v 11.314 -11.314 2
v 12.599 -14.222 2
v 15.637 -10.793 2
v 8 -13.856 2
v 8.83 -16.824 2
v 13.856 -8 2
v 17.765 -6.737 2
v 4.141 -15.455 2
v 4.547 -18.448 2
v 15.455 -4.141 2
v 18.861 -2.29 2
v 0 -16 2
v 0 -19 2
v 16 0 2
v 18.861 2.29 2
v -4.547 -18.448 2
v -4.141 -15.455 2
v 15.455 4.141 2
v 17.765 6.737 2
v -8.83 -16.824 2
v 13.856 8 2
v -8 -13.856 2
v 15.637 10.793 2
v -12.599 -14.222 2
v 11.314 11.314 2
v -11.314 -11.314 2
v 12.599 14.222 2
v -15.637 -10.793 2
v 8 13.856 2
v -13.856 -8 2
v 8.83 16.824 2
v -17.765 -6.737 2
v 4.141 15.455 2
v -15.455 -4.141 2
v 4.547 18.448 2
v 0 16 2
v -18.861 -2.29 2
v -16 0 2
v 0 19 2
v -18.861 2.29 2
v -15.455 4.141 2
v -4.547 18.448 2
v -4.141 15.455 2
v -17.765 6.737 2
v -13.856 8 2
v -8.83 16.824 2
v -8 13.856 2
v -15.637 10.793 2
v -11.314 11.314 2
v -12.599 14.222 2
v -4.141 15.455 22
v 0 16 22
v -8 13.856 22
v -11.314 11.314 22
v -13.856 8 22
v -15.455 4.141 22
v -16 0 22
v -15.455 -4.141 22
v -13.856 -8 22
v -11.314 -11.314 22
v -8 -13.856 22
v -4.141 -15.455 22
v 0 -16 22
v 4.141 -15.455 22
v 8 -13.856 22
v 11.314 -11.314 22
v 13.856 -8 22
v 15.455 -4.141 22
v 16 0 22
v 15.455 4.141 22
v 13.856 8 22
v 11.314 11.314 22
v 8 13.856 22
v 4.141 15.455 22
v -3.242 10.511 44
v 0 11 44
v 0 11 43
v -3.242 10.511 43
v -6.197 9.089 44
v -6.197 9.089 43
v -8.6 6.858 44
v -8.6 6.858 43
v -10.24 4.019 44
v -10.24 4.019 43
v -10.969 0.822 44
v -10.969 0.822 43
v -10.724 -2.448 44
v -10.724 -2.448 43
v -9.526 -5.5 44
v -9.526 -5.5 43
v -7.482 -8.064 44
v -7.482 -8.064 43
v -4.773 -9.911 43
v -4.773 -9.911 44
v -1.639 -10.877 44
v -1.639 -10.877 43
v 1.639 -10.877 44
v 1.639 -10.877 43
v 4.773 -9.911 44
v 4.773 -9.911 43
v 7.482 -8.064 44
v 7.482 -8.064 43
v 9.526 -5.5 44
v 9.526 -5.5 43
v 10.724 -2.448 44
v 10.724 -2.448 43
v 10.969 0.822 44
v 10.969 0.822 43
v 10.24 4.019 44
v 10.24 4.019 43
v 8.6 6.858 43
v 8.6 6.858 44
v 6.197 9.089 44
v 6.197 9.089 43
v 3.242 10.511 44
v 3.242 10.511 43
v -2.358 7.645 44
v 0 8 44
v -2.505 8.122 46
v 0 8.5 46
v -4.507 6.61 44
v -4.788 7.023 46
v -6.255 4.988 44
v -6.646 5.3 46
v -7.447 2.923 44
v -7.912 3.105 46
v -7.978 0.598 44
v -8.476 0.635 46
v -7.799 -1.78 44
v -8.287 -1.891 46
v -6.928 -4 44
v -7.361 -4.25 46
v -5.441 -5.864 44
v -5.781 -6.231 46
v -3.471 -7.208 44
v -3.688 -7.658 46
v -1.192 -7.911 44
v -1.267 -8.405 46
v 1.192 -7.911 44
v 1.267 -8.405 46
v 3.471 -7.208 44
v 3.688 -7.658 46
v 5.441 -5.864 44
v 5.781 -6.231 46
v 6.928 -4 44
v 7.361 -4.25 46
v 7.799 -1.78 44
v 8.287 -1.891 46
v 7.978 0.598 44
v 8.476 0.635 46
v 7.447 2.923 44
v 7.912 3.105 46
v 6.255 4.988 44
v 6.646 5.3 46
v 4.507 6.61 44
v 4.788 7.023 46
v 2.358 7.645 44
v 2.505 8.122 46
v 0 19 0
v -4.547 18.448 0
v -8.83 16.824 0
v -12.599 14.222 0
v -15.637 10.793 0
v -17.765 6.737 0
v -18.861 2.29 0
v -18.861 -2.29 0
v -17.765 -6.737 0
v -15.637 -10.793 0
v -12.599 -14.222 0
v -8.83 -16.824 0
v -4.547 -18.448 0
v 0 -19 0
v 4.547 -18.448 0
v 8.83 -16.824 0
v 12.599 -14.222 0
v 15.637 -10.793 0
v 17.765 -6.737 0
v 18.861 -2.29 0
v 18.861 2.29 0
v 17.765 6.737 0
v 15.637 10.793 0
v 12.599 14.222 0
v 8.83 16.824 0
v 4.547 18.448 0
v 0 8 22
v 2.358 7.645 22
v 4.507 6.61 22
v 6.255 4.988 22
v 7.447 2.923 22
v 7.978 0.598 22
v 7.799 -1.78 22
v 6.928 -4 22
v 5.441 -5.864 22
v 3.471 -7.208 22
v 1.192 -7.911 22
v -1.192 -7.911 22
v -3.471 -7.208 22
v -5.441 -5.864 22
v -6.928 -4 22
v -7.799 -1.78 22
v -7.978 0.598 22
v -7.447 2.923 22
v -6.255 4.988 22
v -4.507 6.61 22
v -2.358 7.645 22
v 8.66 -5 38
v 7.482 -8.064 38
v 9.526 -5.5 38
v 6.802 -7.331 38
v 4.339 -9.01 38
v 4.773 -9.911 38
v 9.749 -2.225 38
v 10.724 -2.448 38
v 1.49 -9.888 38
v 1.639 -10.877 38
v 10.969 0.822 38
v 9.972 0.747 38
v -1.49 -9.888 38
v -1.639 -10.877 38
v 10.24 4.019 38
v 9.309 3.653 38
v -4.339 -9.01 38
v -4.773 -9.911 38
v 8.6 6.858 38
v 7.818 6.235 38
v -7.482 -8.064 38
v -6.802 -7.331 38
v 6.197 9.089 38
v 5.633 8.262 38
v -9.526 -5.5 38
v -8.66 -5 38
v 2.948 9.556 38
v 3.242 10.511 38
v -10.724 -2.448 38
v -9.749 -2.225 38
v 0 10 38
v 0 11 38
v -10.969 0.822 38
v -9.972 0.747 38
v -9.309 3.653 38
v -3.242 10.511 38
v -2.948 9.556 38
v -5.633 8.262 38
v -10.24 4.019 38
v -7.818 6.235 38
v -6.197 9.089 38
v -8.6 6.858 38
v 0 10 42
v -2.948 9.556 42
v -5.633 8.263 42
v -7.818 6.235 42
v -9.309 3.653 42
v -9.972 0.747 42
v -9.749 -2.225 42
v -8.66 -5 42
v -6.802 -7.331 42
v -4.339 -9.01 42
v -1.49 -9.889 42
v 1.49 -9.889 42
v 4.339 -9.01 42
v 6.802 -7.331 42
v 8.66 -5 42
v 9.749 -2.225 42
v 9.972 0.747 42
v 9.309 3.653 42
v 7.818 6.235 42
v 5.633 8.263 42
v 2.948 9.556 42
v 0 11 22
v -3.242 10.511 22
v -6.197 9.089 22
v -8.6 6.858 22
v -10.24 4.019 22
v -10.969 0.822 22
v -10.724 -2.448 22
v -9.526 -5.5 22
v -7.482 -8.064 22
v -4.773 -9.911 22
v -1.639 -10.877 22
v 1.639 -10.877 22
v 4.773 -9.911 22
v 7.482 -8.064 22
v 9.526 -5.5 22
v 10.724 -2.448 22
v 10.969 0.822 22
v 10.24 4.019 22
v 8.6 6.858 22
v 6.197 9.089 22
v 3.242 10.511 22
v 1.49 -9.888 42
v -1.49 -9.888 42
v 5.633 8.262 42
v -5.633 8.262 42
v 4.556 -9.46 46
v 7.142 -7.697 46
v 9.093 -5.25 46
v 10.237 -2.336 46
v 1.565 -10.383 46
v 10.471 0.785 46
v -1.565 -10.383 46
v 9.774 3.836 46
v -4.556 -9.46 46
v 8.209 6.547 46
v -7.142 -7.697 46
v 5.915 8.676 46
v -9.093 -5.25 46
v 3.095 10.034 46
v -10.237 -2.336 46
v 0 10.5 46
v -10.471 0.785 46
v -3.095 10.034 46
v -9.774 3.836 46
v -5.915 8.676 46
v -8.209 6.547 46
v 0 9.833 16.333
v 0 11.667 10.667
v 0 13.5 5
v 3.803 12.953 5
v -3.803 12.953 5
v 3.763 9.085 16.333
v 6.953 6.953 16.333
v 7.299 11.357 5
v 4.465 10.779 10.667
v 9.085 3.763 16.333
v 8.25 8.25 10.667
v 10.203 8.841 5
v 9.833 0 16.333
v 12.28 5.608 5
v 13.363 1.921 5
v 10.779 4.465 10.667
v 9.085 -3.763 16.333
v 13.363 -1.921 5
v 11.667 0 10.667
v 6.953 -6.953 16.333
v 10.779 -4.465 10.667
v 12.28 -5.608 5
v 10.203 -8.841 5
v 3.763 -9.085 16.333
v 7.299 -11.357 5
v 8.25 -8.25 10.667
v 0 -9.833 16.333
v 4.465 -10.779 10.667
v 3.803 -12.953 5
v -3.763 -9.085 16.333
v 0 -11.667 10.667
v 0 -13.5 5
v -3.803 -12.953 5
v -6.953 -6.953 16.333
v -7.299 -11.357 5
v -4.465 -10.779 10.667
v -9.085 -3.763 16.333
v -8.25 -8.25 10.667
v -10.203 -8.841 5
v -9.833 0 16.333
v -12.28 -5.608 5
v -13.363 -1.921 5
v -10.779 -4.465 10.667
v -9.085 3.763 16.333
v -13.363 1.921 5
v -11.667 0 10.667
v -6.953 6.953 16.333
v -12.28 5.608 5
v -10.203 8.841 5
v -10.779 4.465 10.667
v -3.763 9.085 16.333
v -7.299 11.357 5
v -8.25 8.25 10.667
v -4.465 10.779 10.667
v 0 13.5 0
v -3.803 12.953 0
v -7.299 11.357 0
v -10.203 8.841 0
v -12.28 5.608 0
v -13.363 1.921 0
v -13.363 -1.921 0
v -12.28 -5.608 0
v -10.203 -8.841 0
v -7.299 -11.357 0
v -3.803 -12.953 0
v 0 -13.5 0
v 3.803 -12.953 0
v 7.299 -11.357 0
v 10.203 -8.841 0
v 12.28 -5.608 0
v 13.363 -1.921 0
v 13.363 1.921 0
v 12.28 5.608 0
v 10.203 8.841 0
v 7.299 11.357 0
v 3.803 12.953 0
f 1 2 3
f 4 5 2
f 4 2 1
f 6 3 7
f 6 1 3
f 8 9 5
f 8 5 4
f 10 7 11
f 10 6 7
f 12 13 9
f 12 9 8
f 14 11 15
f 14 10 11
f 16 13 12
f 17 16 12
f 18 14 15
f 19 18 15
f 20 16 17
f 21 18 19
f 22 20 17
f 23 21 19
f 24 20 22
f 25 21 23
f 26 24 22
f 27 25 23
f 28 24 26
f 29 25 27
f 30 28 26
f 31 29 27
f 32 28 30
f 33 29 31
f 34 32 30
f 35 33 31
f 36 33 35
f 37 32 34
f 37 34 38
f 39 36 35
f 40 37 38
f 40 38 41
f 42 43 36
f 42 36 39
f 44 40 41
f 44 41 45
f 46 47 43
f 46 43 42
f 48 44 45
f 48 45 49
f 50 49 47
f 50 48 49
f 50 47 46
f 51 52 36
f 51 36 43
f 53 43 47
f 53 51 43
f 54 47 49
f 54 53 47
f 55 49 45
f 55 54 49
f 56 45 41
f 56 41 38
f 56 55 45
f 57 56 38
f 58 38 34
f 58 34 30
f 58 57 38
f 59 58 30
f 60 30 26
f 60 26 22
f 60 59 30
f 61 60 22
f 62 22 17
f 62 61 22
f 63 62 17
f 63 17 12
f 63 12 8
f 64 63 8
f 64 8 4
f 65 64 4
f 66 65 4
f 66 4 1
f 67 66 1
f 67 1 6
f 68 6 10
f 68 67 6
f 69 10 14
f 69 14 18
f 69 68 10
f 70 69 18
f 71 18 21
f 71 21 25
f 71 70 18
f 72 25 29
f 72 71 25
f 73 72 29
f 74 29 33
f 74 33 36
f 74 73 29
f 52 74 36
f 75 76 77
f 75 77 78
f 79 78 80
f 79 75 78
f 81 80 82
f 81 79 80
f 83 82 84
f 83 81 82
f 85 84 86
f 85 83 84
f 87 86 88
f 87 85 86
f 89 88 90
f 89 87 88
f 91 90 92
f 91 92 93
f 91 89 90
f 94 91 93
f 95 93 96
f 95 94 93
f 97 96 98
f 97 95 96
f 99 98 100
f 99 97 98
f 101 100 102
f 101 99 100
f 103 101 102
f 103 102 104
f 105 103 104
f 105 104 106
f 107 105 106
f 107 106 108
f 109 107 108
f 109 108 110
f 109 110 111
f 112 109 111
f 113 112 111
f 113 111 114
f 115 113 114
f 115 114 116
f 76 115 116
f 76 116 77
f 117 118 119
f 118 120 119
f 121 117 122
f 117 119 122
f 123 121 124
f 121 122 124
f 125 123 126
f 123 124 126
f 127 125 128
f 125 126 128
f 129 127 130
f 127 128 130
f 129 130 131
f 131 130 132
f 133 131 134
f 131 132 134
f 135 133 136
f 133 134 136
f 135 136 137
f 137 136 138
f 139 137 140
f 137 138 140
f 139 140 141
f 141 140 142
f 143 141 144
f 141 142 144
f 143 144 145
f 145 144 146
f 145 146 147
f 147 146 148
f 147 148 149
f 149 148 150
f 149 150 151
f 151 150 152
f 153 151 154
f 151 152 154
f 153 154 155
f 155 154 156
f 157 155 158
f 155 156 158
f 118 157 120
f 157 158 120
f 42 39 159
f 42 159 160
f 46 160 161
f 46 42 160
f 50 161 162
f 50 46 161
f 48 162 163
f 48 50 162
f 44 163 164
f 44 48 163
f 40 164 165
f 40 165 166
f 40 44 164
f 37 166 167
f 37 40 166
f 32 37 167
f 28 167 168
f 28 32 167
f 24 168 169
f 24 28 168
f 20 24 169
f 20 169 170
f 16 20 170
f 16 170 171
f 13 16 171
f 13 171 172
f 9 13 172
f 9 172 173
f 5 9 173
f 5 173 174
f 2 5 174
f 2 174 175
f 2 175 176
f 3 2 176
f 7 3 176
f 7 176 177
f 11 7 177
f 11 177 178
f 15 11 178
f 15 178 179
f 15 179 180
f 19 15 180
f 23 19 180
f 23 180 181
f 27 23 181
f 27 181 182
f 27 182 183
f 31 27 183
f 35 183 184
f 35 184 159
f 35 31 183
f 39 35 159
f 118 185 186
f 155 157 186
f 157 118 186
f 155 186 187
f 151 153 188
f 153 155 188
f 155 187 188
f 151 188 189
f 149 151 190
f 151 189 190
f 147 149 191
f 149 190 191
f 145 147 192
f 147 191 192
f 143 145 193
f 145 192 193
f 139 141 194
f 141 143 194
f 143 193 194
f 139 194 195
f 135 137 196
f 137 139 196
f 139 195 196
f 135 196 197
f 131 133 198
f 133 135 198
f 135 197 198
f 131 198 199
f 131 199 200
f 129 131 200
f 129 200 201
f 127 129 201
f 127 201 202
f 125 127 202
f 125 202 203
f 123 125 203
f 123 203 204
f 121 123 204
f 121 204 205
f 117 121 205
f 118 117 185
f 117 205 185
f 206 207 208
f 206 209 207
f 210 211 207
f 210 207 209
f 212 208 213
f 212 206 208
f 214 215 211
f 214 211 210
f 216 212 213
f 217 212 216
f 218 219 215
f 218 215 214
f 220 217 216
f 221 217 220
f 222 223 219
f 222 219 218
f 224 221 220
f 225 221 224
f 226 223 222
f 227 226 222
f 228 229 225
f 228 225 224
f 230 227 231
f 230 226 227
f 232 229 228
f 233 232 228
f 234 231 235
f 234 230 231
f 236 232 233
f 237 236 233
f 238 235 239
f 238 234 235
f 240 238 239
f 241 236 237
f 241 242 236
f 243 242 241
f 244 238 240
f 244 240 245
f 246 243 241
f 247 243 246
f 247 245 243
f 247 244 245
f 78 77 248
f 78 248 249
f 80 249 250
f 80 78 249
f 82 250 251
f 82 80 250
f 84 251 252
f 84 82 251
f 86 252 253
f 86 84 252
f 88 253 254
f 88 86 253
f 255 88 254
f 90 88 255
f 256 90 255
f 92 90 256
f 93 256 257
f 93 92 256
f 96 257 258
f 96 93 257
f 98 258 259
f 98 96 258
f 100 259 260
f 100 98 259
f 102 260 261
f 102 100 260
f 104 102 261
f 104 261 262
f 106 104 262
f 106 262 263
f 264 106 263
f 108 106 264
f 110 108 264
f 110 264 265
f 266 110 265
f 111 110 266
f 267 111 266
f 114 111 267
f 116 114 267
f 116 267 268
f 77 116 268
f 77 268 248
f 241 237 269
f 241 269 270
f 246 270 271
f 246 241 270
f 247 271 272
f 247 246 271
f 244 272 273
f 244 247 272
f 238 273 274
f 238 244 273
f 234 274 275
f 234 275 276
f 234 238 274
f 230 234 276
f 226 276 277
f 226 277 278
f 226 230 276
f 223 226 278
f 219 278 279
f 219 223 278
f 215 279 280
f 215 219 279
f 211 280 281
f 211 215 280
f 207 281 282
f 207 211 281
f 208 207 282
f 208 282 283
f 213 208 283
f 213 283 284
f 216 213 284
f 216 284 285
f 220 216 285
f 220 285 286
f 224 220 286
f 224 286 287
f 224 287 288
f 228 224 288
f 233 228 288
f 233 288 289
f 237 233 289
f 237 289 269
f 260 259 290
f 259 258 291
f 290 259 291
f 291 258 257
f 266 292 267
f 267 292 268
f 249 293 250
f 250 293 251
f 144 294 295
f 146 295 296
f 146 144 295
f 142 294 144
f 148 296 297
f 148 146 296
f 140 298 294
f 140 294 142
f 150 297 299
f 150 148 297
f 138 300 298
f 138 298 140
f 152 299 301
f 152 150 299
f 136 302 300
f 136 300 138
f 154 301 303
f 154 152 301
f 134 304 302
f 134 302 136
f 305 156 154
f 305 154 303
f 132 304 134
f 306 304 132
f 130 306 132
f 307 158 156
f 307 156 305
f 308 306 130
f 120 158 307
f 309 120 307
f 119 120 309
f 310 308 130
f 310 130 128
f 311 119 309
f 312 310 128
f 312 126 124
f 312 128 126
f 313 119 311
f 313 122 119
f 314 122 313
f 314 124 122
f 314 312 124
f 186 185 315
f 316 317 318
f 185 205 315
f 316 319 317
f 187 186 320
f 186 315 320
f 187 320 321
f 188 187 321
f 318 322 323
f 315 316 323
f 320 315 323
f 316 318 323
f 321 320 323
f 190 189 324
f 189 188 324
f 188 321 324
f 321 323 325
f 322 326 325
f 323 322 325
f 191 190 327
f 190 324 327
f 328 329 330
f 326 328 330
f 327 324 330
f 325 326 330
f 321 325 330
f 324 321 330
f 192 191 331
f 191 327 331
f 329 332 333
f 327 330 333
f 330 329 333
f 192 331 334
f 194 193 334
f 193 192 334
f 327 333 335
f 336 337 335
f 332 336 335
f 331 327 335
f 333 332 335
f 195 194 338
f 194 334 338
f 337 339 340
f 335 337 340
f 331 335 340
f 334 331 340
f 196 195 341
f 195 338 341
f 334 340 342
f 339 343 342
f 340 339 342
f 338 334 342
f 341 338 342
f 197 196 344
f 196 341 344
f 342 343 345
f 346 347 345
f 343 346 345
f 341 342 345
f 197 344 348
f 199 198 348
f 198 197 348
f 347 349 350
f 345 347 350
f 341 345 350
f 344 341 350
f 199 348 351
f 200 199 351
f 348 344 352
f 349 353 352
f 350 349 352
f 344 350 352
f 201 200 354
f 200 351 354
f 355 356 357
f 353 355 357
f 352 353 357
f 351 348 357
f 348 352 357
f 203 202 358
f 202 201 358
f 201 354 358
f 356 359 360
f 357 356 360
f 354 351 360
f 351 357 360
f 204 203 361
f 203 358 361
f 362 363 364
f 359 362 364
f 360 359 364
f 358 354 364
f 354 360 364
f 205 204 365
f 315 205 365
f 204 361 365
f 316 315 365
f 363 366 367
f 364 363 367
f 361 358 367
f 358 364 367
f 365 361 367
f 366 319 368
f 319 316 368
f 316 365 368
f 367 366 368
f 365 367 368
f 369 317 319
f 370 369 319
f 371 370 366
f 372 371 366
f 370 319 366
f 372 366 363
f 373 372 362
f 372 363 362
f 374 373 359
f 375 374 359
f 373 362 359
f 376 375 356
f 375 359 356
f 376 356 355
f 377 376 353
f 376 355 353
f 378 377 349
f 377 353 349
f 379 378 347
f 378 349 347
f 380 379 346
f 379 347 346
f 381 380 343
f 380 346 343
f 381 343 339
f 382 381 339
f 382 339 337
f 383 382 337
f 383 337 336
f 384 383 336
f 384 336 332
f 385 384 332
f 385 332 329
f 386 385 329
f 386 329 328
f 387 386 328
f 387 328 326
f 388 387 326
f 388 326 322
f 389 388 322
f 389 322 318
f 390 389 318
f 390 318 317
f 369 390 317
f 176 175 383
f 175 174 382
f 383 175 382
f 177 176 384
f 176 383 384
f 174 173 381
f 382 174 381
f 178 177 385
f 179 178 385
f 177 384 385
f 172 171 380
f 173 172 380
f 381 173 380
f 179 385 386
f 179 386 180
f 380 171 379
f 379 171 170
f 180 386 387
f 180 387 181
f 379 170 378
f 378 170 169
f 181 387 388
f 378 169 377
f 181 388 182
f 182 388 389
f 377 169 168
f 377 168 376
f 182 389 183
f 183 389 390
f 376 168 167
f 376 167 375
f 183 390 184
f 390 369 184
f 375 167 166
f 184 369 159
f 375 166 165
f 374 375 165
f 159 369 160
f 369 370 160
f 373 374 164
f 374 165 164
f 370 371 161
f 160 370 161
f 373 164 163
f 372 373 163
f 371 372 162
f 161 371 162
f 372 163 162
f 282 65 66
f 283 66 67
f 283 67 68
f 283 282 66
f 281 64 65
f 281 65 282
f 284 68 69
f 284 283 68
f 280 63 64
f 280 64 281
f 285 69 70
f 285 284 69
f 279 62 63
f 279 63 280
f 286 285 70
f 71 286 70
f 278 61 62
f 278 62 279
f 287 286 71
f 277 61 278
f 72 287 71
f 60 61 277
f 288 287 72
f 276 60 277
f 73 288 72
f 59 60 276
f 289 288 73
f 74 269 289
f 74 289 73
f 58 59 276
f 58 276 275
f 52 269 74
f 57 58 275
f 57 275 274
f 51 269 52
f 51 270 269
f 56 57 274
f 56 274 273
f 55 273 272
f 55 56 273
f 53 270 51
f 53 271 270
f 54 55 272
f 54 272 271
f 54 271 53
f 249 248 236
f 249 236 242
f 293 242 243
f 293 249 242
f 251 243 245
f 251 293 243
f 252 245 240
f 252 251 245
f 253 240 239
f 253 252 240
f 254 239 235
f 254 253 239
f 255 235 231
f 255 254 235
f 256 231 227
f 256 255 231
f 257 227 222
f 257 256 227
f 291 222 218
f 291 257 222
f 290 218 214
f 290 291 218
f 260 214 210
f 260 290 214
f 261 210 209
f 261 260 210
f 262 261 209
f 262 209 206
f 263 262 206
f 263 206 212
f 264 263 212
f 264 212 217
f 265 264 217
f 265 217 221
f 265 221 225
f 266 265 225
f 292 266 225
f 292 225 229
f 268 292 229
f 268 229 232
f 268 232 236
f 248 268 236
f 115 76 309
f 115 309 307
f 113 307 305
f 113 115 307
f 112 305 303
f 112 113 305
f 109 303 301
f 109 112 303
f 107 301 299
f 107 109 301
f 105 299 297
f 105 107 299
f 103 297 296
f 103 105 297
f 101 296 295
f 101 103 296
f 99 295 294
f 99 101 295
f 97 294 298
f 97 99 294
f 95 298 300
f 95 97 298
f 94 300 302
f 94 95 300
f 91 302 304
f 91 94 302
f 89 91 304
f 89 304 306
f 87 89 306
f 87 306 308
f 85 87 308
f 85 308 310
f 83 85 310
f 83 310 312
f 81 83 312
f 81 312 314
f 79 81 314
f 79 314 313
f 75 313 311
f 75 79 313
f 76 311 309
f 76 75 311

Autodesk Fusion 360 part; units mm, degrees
sketch "Skizze1" plane through (0, 0, 0) normal (1, 0, 0) x (0, 1, 0) in component "Schlauchadapter-22mm-40mm NATO"
  line L0 (0, -8) -> (0, 92) construction
  line L1 (0, 0) -> (19, 0) construction
  line L2 (13.5, -8.8503) -> (13.5, 10.0011) construction
  line L3 (16, -9) -> (16, -8)
  line L4 (16, -8) -> (16, 12.6517) construction
  line L5 (8, 9.6655) -> (8, 11)
  line L6 (8, 11) -> (8, 32.4994) construction
  line L7 (13.5, 0) -> (19, 0)
  line L8 (19, 0) -> (19, 2)
  line L9 (19, 2) -> (16, 2)
  line L10 (16, 2) -> (16, 22)
  line L11 (13.5, 0) -> (13.5, 5)
  line L12 (16, 22) -> (-10.2408, 22) construction
  line L13 (11, 9.9222) -> (11, 30.0778) construction
  line L14 (16, 22) -> (11, 22)
  line L15 (11, 22) -> (11, 38)
  line L16 (8, 28.4613) -> (8, 38.3723) construction
  line L17 (10, 31.378) -> (10, 40.0422) construction
  line L18 (11, 38) -> (10, 38)
  line L19 (10, 38) -> (10, 42)
  line L20 (11, 38) -> (-2.5, 38) construction
  line L21 (8, 22) -> (8, 38)
  line L22 (11, 22) -> (11, 43) construction
  line L23 (10, 42) -> (11, 42)
  line L24 (11, 42) -> (11, 46)
  line L25 (11, 46) -> (8, 46)
  line L26 (8, 46) -> (8, 38)
  line L27 (8, 22) -> (13.5, 5)
  dimension "d16" = 19
  dimension "d17" = 13.5
  dimension "d18" = 16
  dimension "d19" = 8
  dimension "d20" = 2
  dimension "d21" = 20
  dimension "d22" = 5
  dimension "d23" = 11
  dimension "d24" = 16
  dimension "d25" = 8
  dimension "d26" = 10
  dimension "d27" = 4
  dimension "d28" = 4
revolve "Drehen1" add sketch "Skizze1" angle 360 about axis through (0, 0, -8) along (0, 0, 1) in component "Schlauchadapter-22mm-40mm NATO"
chamfer "Fase1" distance 2 distance2 0.5 1 edges at (-10.2556, 3.9778, 46) measured on face at (0.5483, 10.9863, 43.3333) in component "Schlauchadapter-22mm-40mm NATO"
chamfer "Fase2" distance 1 angle 45 1 edges at (-10.2556, 3.9778, 42) in component "Schlauchadapter-22mm-40mm NATO"
chamfer "Fase4" distance 0.5 distance2 2 1 edges at (-7.4586, 2.8929, 46) measured on face at (0.9191, 9.5978, 46) in component "Schlauchadapter-22mm-40mm NATO"
component "Schlauchadapter-22mm-40mm NATO" placed x (1, 0, 0) y (0, 1, 0) z (0, 0, 1) at (0, 0, 0)
